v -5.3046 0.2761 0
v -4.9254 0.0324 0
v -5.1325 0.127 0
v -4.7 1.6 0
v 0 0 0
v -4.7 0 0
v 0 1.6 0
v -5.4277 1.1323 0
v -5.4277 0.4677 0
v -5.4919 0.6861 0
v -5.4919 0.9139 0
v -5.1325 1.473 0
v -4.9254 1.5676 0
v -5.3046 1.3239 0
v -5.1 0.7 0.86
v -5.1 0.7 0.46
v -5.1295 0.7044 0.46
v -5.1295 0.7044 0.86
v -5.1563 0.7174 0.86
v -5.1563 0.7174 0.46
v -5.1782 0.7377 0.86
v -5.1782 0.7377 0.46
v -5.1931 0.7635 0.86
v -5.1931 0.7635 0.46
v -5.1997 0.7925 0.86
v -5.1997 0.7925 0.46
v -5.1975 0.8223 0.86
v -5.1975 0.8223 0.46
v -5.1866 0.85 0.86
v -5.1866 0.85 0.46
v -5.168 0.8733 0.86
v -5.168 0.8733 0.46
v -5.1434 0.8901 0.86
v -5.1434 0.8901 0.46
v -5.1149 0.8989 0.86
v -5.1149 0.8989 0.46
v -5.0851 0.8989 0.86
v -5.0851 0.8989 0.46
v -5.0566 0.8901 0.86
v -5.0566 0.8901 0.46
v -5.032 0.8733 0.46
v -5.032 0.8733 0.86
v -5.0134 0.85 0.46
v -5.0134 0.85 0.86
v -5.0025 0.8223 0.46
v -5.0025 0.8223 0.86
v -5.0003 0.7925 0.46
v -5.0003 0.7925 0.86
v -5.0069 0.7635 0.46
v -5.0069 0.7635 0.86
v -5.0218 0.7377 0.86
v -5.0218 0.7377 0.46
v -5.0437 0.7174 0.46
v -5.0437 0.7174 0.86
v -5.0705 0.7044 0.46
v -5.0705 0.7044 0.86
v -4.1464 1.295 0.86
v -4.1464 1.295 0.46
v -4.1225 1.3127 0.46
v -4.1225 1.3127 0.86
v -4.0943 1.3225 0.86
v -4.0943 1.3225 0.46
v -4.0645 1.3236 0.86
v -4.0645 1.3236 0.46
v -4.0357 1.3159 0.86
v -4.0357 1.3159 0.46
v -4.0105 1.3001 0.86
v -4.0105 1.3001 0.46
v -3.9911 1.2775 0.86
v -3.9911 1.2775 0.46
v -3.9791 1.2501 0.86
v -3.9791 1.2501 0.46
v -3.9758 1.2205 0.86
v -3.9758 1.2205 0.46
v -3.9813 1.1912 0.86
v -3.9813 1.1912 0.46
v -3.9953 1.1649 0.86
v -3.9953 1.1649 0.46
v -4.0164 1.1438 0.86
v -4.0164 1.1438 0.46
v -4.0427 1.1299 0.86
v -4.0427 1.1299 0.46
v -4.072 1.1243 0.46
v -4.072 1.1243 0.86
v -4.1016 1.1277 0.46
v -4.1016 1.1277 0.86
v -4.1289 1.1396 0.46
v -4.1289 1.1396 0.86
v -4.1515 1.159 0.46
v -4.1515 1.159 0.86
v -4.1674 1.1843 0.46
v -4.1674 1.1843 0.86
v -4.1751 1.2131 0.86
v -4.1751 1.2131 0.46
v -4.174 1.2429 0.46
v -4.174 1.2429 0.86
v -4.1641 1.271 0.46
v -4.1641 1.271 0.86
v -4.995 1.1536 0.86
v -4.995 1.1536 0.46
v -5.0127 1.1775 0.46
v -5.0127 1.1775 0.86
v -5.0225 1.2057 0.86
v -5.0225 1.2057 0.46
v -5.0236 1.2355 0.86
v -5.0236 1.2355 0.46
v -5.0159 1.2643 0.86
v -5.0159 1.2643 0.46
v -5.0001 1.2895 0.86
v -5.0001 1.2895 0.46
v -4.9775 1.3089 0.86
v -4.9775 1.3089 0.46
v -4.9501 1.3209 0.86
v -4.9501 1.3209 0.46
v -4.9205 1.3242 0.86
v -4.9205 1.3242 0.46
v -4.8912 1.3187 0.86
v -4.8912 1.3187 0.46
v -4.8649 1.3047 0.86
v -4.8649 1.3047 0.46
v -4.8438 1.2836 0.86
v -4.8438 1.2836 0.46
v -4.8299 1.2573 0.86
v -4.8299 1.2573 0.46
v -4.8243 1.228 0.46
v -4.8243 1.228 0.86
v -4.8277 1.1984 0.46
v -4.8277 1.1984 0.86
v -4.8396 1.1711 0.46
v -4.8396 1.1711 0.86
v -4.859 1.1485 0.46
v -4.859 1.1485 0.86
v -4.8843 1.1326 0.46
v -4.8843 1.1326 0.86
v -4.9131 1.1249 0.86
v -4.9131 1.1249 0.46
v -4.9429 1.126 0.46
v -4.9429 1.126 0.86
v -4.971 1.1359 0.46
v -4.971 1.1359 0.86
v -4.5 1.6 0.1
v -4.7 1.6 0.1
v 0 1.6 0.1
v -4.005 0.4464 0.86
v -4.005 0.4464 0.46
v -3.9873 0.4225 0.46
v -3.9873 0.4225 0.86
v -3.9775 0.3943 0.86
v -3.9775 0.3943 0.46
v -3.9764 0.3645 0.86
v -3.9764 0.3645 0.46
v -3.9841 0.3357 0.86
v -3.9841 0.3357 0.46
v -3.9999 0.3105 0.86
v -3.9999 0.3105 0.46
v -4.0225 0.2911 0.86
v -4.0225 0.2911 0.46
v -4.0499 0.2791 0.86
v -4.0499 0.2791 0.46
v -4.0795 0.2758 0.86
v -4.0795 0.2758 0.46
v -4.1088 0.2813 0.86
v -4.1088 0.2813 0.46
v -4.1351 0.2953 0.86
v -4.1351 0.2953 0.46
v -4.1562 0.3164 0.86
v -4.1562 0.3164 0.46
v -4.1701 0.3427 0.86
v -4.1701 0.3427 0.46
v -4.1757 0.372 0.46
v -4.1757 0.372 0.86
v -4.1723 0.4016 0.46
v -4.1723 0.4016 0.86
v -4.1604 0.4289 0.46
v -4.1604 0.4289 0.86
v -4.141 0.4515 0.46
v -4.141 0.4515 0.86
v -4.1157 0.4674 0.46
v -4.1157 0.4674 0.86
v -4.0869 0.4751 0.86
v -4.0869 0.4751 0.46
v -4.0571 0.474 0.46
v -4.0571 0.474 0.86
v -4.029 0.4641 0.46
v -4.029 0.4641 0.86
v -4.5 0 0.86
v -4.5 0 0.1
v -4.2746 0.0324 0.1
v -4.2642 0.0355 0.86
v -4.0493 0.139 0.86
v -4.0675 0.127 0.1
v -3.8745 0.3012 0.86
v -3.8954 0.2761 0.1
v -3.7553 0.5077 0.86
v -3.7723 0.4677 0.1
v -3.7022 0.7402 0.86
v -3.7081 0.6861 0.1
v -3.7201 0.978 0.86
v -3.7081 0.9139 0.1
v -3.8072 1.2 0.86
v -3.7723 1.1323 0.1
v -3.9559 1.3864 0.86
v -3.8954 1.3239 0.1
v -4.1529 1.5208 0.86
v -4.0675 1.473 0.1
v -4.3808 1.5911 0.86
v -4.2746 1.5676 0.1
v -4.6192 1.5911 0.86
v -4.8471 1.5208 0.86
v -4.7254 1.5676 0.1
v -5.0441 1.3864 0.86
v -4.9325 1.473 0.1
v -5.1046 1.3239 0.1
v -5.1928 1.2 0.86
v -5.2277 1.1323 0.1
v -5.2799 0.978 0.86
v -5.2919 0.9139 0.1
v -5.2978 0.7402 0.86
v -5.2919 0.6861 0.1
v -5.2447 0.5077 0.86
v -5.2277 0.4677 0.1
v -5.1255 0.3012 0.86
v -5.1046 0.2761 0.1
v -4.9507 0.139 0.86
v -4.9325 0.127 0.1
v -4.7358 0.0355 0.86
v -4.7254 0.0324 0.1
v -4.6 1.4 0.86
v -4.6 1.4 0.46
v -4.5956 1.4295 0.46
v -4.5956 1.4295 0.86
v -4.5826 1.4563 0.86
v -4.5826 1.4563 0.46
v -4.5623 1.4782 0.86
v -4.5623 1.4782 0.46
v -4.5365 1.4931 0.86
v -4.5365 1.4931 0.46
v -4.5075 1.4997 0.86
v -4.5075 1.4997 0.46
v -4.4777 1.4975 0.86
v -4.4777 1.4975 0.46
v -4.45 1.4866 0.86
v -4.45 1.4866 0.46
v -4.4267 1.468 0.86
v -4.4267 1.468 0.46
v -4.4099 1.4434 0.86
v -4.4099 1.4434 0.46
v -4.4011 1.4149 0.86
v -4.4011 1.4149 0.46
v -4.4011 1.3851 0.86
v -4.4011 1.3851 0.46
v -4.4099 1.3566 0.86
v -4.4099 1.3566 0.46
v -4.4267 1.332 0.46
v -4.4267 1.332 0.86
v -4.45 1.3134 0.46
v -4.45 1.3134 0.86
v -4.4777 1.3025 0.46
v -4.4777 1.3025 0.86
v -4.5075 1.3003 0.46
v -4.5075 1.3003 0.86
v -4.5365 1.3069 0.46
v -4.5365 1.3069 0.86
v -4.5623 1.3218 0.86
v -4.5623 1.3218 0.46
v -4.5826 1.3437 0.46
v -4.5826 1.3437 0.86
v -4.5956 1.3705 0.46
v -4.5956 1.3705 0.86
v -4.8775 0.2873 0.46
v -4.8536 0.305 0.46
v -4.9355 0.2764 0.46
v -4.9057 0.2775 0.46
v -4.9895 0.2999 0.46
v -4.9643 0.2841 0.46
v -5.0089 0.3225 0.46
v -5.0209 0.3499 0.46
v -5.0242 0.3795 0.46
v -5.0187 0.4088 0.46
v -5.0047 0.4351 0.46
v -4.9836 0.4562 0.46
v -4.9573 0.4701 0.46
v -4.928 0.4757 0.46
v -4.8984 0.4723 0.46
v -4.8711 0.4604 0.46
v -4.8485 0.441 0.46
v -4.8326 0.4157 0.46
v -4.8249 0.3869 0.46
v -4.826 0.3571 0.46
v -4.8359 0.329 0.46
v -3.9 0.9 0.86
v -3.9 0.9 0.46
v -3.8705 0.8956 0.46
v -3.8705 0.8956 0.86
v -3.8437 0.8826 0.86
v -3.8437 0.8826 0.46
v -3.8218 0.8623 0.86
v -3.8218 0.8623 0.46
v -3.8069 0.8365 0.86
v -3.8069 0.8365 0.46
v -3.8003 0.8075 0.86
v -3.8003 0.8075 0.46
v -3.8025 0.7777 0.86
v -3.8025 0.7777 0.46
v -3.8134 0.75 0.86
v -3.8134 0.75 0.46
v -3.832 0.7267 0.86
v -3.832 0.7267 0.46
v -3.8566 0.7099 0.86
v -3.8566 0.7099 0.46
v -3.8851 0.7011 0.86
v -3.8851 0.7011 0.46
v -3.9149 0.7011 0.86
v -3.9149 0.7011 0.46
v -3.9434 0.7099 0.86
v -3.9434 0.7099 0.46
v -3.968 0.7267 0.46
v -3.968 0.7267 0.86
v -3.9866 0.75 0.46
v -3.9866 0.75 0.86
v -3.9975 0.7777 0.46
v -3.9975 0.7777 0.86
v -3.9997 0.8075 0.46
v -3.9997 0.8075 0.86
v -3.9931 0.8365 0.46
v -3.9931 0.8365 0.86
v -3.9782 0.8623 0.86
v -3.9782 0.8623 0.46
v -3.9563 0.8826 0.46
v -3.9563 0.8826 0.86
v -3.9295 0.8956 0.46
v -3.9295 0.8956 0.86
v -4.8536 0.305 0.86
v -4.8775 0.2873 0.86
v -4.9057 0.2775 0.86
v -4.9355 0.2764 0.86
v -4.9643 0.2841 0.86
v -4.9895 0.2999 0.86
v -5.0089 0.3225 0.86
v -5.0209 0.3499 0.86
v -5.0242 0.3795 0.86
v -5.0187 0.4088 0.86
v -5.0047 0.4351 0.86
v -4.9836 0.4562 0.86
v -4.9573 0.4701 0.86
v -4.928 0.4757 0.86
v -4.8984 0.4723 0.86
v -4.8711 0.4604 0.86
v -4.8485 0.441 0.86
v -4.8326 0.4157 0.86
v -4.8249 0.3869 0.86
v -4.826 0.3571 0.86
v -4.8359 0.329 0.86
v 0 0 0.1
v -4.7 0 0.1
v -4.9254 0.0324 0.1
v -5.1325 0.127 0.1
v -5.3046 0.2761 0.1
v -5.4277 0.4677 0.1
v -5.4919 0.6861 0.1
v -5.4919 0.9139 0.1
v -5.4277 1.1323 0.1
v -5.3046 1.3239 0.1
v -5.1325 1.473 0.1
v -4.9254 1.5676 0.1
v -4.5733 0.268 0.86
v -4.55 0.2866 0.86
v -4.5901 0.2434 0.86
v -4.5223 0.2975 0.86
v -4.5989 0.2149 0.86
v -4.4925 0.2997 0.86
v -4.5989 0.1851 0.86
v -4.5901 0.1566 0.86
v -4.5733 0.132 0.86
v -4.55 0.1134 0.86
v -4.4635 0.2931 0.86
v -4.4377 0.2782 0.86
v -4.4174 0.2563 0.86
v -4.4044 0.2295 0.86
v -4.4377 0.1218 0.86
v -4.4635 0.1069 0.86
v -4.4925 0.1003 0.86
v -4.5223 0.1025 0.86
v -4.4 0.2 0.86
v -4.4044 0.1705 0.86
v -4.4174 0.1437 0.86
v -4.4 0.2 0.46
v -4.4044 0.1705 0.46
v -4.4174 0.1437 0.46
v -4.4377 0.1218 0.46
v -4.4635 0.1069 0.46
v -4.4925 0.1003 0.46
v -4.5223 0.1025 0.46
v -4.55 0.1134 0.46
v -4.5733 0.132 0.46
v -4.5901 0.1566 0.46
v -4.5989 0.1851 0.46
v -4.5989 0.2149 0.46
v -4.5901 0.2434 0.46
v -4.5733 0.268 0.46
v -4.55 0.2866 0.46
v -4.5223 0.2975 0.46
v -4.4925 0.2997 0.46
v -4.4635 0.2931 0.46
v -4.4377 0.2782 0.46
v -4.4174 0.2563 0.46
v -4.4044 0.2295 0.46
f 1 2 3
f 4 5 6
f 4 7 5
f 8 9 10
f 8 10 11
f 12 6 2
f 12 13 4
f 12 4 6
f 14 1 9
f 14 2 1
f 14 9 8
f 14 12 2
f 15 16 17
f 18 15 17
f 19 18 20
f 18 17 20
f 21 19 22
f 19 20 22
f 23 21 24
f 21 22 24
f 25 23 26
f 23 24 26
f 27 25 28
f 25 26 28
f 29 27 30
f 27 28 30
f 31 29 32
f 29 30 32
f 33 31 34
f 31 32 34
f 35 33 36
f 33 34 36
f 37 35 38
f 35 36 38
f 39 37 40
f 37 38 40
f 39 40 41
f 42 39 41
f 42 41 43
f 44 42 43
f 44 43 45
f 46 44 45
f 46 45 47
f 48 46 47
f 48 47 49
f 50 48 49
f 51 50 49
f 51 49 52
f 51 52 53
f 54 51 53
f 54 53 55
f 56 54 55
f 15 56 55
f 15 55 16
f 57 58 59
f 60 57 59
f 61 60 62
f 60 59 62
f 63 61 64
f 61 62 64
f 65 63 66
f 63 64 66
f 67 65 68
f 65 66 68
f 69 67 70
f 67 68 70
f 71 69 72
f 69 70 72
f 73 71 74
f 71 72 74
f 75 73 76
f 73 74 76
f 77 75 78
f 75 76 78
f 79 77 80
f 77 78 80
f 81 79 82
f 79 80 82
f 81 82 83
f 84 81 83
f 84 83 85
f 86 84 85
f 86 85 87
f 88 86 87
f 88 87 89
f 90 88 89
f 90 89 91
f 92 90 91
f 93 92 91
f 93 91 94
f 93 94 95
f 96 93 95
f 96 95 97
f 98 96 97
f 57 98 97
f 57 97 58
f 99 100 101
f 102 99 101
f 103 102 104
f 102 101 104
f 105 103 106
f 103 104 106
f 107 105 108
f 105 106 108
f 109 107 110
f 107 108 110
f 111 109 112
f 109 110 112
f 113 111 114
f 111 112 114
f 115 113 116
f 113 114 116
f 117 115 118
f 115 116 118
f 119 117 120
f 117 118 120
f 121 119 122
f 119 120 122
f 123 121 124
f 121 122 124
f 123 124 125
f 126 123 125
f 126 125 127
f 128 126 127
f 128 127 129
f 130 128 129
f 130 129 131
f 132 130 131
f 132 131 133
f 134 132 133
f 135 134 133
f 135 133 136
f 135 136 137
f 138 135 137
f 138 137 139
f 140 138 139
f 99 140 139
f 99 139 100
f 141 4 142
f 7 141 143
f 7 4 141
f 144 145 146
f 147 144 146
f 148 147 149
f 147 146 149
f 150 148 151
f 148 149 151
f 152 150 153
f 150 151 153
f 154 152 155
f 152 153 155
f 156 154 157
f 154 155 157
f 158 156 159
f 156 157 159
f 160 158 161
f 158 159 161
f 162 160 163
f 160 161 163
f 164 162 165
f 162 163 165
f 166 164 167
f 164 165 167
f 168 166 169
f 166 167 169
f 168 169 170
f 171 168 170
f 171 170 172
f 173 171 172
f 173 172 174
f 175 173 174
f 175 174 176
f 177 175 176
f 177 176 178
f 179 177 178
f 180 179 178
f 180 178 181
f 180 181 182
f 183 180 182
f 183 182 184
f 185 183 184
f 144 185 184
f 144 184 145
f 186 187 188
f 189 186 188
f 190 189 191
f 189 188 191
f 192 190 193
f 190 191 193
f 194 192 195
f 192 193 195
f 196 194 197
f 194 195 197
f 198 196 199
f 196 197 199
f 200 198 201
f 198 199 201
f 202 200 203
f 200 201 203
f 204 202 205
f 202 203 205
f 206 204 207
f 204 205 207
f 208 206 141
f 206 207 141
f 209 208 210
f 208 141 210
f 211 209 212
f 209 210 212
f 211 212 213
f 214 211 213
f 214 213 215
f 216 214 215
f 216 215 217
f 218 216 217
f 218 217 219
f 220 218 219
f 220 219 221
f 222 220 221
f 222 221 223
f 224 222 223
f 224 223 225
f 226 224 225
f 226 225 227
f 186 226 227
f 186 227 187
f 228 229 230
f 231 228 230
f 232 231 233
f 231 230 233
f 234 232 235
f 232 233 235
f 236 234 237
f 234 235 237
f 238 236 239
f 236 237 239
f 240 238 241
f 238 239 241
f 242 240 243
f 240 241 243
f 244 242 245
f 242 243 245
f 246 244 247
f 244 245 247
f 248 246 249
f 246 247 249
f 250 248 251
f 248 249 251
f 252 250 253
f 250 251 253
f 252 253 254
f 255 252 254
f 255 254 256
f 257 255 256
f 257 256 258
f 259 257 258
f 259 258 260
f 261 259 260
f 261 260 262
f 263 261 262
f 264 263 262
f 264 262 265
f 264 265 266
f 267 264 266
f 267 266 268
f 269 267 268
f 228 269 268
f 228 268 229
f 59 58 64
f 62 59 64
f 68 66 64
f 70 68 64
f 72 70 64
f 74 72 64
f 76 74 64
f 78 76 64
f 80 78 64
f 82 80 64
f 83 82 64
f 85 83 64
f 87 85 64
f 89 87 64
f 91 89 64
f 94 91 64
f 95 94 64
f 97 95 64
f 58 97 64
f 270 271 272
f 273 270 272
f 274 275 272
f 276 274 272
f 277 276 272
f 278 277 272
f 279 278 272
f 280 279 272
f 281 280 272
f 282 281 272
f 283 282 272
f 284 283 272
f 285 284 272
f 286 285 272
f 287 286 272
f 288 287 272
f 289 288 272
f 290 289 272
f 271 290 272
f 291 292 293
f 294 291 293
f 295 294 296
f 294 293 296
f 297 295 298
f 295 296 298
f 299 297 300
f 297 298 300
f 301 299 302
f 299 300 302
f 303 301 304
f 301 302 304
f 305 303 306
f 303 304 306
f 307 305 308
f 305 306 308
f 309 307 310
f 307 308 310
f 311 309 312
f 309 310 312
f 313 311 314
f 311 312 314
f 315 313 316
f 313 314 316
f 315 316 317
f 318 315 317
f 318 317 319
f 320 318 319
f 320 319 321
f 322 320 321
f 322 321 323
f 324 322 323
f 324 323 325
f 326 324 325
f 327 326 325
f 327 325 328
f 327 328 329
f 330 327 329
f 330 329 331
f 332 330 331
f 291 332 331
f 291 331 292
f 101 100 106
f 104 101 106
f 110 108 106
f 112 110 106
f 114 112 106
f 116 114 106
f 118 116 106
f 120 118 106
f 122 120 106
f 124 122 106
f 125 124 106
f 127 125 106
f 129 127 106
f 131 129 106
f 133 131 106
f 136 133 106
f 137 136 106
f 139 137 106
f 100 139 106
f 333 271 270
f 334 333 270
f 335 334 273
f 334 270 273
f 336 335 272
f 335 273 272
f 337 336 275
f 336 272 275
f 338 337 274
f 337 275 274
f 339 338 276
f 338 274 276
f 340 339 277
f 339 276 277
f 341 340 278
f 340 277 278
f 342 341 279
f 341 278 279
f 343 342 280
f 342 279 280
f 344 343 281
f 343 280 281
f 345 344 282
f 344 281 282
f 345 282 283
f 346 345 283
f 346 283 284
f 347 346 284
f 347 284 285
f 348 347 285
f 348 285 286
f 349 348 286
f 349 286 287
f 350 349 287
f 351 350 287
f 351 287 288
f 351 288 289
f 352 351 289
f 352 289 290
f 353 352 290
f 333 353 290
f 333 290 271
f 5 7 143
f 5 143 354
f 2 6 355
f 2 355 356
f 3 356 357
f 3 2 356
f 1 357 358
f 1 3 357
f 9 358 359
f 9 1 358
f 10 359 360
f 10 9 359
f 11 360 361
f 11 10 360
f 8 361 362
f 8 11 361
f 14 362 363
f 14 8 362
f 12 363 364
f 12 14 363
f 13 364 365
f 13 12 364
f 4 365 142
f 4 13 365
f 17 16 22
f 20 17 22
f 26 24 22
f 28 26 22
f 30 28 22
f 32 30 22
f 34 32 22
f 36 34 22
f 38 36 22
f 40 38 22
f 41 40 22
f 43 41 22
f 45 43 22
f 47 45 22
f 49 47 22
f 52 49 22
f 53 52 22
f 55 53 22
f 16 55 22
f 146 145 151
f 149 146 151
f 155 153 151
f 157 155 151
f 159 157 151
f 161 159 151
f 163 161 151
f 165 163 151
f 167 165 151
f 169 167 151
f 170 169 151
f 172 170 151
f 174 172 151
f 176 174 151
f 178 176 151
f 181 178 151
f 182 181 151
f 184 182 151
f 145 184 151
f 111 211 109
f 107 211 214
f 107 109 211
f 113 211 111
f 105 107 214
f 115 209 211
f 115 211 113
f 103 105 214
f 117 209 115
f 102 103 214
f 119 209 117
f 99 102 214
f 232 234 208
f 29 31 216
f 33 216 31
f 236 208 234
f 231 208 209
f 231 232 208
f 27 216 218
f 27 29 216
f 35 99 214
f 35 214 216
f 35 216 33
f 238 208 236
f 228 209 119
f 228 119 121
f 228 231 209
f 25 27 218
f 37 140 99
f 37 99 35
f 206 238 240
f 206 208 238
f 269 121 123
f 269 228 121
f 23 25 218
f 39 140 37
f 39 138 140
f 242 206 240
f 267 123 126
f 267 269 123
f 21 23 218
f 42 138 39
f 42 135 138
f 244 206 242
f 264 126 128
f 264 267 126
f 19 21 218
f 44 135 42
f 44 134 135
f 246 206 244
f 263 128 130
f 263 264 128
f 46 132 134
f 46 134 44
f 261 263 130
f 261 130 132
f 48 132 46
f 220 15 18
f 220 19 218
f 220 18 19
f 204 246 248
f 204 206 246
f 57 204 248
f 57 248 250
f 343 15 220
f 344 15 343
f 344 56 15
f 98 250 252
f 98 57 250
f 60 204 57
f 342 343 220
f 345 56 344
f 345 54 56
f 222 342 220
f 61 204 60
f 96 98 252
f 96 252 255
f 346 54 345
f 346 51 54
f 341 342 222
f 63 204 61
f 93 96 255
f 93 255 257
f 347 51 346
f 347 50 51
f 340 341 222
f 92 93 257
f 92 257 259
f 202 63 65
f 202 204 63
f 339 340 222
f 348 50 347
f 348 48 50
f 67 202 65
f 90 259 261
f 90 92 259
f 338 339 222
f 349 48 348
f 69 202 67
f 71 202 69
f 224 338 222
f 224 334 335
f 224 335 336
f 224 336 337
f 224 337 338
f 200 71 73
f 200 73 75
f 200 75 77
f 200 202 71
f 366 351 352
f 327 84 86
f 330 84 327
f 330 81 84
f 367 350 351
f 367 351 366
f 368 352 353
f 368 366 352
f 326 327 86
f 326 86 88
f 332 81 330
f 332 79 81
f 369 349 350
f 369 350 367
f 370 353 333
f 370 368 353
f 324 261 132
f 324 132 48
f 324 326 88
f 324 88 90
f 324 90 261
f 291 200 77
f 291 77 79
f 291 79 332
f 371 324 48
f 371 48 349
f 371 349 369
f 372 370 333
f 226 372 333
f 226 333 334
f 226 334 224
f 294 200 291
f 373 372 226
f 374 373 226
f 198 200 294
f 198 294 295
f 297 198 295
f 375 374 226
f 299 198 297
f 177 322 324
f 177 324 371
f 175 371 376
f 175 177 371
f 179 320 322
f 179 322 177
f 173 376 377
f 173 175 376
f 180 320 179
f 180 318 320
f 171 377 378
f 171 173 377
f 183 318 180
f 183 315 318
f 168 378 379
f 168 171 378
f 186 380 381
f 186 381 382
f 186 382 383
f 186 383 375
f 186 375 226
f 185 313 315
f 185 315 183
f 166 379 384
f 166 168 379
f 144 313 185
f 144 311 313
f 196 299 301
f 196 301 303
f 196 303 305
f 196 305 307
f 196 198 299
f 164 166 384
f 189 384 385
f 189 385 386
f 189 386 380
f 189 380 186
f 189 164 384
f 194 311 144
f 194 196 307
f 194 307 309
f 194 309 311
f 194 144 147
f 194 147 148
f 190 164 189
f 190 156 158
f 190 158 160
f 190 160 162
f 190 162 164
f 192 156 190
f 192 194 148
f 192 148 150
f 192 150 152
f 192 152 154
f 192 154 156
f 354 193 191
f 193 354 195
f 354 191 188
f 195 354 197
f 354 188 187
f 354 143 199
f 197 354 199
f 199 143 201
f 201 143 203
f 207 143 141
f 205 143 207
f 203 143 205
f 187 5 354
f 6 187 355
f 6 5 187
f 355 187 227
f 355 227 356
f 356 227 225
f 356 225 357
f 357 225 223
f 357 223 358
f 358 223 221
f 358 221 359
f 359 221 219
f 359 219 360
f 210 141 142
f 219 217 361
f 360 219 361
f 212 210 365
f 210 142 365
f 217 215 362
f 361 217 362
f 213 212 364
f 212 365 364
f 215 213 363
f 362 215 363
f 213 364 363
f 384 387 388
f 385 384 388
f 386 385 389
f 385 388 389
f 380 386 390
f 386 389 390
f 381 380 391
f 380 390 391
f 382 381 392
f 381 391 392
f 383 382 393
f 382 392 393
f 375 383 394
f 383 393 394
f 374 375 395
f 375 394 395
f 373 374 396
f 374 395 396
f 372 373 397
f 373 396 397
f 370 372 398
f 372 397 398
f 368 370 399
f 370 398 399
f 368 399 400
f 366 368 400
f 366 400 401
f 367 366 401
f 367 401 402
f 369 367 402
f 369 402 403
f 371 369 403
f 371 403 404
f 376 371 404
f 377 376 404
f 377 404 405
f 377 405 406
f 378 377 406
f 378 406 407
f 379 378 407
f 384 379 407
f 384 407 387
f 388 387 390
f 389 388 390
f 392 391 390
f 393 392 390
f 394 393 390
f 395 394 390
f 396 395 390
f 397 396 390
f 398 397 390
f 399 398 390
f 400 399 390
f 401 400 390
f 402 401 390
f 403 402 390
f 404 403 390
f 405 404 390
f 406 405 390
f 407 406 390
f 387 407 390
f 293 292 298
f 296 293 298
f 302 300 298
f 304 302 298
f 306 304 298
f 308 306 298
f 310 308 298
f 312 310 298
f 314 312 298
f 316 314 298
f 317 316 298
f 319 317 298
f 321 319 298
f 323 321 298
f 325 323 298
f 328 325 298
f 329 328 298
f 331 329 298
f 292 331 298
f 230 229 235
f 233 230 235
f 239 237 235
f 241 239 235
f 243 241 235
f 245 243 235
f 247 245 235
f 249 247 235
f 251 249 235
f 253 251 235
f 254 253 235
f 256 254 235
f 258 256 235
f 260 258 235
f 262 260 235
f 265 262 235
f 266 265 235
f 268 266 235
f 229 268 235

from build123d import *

# Parameters (mm, degrees)
AUFSATZ_LINEAR_AUSTRAGEN1_DEPTH = 0.1
SKIZZE2_R                       = 0.8
AUFSATZ_LINEAR_AUSTRAGEN2_DEPTH = 0.76
DURCHGANGSLOCH_F_R_M1_41_D      = 0.2
DURCHGANGSLOCH_F_R_M1_41_DEPTH  = 0.4
KREISMUSTER5_COUNT              = 8


with BuildPart() as part:
    # Skizze1 → Aufsatz-Linear austragen1 (new body)
    with BuildSketch(Plane.XY):
        with BuildLine():
            Line((0, 0), (-4.7, 0))
            ThreePointArc((-4.7, 0), (-5.5, 0.8), (-4.7, 1.6))
            Line((-4.7, 1.6), (0, 1.6))
            Line((0, 1.6), (0, 0))
        make_face()
    extrude(amount=AUFSATZ_LINEAR_AUSTRAGEN1_DEPTH)

    # Skizze2 → Aufsatz-Linear austragen2 (add)
    with BuildSketch(Plane.XY.offset(0.1)):
        with Locations(Location((-4.5, 0.8, 0), (0, 0, 270))):  # turned: the seam where the file's is
            Circle(SKIZZE2_R)
    extrude(amount=AUFSATZ_LINEAR_AUSTRAGEN2_DEPTH)

    # Durchgangsloch für M1.41
    with Locations(Plane(origin=(-4.5, 1.4, 0.86), x_dir=(1, 0, 0), z_dir=(0, 0, 1))):
        with Locations((0, 0)):
            durchgangsloch_f_r_m1_41 = Hole(DURCHGANGSLOCH_F_R_M1_41_D / 2, depth=DURCHGANGSLOCH_F_R_M1_41_DEPTH)

    # Kreismuster5: Durchgangsloch für M1.41 ×8 about axis
    kreismuster5_axis = Axis((-4.5, 0.8, 0), (0, 0, 1))
    for i in range(1, KREISMUSTER5_COUNT):
        add(durchgangsloch_f_r_m1_41.rotate(kreismuster5_axis, i * 360 / KREISMUSTER5_COUNT), mode=Mode.SUBTRACT)


solid = part.part
